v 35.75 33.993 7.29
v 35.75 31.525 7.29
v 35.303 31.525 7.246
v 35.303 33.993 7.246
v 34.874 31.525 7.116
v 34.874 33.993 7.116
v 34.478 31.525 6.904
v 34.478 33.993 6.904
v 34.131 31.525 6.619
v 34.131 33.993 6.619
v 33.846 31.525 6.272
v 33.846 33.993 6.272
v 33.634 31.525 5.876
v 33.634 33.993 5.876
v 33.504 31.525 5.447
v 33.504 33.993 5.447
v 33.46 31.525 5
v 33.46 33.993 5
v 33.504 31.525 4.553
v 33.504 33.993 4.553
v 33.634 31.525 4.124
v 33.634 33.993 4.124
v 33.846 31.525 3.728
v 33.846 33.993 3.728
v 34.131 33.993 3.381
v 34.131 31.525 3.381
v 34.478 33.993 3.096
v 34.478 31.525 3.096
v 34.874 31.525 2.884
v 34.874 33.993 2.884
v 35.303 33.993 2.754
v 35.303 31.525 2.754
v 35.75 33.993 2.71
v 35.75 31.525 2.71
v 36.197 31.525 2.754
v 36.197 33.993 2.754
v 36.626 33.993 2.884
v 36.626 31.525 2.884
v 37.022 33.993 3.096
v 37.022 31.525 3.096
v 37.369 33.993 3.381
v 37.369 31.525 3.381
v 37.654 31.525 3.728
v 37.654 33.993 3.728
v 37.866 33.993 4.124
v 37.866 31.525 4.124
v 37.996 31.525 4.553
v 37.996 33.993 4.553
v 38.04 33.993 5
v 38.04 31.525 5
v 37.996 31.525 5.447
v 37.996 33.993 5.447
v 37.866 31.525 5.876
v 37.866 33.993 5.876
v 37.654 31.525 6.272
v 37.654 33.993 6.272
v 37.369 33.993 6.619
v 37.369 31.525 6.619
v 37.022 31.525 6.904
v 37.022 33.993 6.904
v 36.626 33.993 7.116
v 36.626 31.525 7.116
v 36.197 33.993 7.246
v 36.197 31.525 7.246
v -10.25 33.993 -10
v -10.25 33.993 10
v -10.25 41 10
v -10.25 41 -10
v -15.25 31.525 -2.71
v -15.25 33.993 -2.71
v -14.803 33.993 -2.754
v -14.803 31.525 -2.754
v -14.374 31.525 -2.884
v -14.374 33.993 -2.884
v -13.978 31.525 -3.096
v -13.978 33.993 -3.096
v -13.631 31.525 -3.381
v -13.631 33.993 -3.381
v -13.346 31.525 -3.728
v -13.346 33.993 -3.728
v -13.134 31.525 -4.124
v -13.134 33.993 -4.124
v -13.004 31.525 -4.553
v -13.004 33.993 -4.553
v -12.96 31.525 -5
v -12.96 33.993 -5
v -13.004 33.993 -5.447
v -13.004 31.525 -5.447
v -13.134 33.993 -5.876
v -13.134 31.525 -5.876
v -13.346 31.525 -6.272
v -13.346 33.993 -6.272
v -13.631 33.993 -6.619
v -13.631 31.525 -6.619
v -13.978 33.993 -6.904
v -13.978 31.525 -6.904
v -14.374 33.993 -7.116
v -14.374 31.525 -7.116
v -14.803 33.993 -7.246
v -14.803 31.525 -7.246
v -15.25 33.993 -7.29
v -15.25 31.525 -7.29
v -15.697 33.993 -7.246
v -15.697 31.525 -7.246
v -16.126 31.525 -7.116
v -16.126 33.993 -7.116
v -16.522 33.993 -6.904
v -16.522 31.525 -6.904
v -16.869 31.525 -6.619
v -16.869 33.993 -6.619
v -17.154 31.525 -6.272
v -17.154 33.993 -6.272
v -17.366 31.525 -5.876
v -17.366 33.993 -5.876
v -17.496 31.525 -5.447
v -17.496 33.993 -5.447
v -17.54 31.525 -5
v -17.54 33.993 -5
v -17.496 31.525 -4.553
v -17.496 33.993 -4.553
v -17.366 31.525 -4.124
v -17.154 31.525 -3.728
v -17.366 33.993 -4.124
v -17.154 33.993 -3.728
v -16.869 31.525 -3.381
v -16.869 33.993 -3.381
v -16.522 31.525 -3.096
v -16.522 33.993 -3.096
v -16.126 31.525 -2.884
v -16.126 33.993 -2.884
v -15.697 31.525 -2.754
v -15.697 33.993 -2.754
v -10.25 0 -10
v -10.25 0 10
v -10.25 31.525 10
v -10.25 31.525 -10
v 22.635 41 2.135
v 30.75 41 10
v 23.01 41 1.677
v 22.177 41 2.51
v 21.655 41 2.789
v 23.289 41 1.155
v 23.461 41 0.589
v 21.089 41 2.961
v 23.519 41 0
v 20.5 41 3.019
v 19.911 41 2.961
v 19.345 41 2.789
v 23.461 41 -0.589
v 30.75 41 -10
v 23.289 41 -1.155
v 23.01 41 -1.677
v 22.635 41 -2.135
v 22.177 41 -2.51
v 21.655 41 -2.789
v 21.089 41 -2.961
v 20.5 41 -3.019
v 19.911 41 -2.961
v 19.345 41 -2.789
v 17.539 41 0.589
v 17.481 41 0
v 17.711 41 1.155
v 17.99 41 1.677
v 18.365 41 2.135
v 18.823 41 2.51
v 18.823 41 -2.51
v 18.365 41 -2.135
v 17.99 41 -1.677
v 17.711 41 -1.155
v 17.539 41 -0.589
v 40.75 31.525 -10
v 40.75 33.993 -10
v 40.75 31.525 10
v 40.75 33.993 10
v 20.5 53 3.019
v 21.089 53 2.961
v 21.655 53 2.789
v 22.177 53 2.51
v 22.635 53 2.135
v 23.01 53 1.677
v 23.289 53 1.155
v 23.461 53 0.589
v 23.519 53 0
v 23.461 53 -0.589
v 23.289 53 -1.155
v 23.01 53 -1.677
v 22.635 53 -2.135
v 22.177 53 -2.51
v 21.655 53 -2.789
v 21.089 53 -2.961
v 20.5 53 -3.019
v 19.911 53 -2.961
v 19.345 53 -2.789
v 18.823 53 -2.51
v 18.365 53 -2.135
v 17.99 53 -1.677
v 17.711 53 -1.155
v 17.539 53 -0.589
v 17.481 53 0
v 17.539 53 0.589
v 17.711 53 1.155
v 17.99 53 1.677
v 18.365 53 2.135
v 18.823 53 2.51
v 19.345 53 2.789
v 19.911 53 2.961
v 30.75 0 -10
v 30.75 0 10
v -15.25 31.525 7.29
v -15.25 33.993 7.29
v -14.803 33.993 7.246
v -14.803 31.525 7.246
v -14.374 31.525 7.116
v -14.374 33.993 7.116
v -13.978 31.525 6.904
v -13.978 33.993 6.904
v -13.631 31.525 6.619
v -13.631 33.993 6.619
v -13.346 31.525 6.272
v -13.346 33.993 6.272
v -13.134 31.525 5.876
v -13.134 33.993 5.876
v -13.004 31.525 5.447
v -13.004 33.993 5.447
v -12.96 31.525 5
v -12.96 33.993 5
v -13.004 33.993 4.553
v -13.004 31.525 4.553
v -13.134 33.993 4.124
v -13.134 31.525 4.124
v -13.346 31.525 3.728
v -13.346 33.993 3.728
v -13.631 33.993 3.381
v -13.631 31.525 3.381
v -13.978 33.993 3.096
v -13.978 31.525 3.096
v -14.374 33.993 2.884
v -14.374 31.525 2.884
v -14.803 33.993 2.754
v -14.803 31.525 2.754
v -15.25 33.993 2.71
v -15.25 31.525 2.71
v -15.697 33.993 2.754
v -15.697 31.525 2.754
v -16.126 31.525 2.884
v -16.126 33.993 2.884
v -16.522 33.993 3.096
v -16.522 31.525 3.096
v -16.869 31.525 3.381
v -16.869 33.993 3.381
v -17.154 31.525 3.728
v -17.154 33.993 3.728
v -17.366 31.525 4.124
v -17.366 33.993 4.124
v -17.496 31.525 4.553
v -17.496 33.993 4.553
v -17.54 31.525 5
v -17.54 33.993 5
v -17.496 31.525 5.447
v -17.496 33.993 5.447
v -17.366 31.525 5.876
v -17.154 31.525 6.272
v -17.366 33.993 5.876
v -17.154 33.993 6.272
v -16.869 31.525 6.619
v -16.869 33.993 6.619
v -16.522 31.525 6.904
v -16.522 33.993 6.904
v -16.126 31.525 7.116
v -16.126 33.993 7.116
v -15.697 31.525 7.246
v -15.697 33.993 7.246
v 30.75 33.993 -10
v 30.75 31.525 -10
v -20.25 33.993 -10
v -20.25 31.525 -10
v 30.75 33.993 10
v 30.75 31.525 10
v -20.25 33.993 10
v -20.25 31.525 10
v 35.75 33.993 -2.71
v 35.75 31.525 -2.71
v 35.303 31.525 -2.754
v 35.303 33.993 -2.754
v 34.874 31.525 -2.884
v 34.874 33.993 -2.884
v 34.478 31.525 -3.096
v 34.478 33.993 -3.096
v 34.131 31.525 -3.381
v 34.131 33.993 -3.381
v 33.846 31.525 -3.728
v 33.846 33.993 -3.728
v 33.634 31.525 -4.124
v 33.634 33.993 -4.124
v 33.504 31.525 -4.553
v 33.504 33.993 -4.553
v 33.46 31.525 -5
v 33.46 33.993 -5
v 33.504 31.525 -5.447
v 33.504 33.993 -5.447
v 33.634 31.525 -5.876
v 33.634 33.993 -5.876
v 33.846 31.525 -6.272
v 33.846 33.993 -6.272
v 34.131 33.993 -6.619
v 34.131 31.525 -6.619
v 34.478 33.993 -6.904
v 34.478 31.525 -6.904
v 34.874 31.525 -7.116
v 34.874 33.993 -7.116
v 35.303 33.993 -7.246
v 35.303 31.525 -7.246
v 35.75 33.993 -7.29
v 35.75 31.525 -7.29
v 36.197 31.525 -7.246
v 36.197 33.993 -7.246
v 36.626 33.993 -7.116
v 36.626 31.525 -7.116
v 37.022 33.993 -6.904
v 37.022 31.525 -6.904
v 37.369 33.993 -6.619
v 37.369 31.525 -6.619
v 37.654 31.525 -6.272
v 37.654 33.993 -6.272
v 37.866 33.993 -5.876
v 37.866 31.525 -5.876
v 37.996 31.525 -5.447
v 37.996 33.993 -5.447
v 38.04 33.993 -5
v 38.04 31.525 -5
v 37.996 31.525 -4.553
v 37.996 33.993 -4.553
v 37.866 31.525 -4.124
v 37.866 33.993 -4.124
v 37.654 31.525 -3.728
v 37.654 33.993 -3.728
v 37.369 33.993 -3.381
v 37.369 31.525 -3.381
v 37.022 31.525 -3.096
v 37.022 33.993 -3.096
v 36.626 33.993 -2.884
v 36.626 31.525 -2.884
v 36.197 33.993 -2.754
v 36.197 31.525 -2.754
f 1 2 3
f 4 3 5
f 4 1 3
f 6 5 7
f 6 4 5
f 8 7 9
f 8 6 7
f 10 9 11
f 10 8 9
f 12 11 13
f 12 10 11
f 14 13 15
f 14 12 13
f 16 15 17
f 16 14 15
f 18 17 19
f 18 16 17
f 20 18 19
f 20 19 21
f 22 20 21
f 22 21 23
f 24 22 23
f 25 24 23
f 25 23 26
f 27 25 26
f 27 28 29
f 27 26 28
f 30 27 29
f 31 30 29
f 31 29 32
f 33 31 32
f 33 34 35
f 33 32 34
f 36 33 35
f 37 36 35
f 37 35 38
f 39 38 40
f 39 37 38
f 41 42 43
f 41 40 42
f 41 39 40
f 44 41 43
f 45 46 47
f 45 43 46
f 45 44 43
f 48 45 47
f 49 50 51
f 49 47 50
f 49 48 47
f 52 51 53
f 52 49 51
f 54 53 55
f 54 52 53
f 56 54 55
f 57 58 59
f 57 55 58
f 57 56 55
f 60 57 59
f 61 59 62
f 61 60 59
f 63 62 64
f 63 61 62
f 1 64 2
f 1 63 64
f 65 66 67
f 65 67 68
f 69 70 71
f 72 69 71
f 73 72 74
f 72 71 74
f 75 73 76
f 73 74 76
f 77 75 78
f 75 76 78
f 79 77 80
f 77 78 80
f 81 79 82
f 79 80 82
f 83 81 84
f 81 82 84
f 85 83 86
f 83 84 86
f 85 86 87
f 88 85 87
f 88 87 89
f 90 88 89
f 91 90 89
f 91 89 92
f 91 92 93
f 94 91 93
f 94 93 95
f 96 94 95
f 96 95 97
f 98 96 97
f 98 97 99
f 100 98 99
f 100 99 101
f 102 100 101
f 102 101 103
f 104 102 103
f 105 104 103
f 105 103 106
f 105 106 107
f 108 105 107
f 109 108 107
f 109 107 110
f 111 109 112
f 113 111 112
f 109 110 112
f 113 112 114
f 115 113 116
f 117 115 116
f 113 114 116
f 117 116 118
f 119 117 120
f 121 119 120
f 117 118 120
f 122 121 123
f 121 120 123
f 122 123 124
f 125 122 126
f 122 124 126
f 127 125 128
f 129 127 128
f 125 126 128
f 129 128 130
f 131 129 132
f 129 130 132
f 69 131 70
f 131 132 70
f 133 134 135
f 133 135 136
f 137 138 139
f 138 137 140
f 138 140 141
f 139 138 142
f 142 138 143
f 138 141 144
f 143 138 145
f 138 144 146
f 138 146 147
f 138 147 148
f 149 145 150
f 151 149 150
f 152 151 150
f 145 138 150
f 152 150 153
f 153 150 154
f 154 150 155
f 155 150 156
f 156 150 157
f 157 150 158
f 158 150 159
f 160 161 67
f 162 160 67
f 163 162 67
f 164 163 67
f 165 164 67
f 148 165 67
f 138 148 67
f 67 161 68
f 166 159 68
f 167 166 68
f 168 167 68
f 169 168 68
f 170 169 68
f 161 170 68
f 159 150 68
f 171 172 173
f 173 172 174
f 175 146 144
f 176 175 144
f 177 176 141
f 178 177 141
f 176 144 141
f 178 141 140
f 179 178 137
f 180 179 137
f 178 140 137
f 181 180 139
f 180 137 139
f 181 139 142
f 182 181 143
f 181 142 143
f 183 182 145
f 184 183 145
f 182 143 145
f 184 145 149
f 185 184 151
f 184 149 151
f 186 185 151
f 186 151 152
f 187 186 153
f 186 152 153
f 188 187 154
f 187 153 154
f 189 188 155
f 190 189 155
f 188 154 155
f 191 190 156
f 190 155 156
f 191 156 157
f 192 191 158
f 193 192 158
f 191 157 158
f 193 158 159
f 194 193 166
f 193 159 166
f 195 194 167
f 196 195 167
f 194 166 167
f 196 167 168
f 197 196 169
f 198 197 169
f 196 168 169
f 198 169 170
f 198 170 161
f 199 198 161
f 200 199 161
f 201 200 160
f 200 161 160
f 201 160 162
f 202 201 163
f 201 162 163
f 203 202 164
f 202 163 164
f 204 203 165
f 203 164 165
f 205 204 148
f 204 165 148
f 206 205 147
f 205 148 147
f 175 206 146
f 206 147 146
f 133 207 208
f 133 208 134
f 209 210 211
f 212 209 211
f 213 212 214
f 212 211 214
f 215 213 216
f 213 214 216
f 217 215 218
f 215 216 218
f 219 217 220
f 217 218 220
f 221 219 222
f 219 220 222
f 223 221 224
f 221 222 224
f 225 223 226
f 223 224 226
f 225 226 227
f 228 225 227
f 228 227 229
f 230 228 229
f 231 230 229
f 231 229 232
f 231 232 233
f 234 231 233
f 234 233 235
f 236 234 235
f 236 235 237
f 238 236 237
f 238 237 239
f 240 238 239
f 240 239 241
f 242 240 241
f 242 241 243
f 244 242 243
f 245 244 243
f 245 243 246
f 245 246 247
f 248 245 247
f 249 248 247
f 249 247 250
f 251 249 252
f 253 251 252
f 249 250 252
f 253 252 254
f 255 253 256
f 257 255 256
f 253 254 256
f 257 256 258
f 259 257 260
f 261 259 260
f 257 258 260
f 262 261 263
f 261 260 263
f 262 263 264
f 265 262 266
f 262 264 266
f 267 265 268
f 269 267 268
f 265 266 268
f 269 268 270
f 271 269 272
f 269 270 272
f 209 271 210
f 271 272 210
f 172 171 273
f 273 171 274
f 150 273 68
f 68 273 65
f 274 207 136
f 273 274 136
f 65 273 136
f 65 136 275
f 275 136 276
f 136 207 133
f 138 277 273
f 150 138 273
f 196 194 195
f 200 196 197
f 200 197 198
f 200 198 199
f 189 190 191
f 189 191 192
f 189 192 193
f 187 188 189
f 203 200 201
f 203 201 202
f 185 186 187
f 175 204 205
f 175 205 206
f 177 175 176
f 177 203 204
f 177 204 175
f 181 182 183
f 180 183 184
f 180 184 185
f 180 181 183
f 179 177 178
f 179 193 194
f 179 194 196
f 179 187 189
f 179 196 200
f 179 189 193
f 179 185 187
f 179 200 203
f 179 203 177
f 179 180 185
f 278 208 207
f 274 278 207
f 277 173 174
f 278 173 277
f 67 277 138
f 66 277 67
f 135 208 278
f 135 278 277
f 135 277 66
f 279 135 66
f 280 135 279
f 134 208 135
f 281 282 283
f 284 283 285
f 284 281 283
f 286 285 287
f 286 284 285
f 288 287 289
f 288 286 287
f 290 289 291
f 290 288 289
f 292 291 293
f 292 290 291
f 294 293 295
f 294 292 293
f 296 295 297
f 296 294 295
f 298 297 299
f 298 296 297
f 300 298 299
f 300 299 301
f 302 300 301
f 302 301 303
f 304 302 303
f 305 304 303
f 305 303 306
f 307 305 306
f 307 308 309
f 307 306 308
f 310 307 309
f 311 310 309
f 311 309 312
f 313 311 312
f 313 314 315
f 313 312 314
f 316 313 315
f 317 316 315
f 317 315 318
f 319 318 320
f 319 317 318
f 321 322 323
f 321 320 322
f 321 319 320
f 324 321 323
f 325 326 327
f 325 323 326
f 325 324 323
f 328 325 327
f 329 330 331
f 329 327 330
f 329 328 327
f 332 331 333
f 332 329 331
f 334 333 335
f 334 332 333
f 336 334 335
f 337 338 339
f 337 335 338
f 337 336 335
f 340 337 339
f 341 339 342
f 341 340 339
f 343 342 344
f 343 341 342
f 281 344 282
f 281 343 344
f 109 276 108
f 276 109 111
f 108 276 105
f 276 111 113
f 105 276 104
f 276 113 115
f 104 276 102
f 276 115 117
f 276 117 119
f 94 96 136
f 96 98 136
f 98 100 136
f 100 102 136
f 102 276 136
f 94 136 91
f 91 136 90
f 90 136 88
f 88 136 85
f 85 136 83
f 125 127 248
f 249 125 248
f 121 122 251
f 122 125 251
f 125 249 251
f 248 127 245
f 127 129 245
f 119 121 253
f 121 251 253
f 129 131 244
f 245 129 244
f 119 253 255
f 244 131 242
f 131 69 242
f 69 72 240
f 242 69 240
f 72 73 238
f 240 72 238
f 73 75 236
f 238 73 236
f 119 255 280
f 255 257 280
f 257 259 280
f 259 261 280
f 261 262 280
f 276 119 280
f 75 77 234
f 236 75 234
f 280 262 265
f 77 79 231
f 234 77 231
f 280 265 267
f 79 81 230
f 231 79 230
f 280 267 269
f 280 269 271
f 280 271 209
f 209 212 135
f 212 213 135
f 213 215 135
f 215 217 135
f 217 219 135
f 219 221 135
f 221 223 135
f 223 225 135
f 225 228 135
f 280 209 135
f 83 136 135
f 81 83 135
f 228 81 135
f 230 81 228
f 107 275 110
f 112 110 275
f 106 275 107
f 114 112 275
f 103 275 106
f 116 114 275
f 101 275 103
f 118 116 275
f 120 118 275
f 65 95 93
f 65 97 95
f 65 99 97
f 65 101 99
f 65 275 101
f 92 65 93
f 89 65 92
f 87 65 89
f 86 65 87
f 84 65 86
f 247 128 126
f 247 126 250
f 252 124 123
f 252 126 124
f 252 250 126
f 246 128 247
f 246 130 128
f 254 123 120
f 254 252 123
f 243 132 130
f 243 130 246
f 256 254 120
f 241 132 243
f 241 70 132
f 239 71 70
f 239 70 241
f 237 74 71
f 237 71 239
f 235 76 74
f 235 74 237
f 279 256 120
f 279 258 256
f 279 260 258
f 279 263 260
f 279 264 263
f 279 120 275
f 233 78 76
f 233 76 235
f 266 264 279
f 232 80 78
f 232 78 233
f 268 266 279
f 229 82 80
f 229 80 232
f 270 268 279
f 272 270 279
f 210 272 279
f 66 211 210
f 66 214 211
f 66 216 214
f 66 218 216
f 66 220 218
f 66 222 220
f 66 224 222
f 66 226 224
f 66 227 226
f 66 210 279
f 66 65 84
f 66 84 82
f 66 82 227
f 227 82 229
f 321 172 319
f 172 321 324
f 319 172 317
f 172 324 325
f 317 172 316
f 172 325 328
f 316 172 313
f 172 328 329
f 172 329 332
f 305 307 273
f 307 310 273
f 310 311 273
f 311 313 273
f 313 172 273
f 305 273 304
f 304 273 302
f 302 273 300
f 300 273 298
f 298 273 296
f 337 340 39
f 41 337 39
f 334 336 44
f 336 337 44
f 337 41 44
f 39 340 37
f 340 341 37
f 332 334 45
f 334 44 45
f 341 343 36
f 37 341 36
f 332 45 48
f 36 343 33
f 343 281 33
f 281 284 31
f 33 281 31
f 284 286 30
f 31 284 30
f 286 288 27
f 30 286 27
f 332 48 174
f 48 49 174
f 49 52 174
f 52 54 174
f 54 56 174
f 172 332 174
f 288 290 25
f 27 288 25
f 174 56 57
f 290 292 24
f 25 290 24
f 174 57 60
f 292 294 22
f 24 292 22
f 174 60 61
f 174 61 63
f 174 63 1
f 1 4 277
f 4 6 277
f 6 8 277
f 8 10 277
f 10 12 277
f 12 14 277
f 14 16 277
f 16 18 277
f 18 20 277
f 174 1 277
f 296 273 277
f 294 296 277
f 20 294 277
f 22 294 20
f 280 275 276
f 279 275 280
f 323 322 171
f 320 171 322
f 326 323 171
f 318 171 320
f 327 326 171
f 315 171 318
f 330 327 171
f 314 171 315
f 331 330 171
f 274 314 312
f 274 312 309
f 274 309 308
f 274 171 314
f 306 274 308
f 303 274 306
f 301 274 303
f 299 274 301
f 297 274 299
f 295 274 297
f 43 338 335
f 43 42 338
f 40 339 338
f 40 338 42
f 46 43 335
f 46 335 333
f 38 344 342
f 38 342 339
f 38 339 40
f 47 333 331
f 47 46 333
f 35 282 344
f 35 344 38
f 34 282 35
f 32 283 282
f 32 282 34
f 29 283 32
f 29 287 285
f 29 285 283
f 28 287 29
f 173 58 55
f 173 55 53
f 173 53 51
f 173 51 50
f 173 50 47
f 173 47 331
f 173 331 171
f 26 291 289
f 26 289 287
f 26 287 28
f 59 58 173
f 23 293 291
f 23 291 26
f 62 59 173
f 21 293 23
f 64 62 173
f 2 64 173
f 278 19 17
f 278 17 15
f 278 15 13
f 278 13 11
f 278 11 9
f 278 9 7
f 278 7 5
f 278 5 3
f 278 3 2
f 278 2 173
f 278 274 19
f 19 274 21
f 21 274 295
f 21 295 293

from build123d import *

# Parameters (mm, degrees)
SKETCH1_W           = 20.5
SKETCH1_H           = 20
BOSS_EXTRUDE1_DEPTH = 41
SKETCH3_W           = 20
SKETCH3_H           = 2.467931734
BOSS_EXTRUDE2_DEPTH = 10
SKETCH4_R           = 2.290313936
CUT_EXTRUDE9_DEPTH  = 10
SKETCH5_R           = 3.018718549
BOSS_EXTRUDE3_DEPTH = 12


with BuildPart() as part:
    # Sketch1 → Boss-Extrude1 (new body)
    with BuildSketch(Plane(origin=(0, 0, 0), x_dir=(1, 0, 0), z_dir=(0, 1, 0))):
        Rectangle(SKETCH1_W, SKETCH1_H)
    boss_extrude1 = extrude(amount=BOSS_EXTRUDE1_DEPTH)

    # Sketch3 → Boss-Extrude2 (add)
    with BuildSketch(Plane.ZY.offset(10.25)):
        with Locations((0, 32.759182637)):
            Rectangle(SKETCH3_W, SKETCH3_H)
    boss_extrude2 = extrude(amount=BOSS_EXTRUDE2_DEPTH)

    # Sketch4 → Cut-Extrude9 (cut)
    with BuildSketch(Plane(origin=(0, 33.993148504, 0), x_dir=(1, 0, 0), z_dir=(0, 1, 0))):
        with Locations(Location((-15.25, 5, 0), (0, 0, 270))):
            Circle(SKETCH4_R)
        with Locations(Location((-15.25, -5, 0), (0, 0, 270))):
            Circle(SKETCH4_R)
    cut_extrude9 = extrude(amount=-CUT_EXTRUDE9_DEPTH, mode=Mode.SUBTRACT)

    # Mirror1: Boss-Extrude1, Boss-Extrude2, Cut-Extrude9 across plane
    add(boss_extrude1.mirror(Plane(origin=(10.25, 41, -10), x_dir=(0, 0, 1), z_dir=(-1, 0, 0))))
    add(boss_extrude2.mirror(Plane(origin=(10.25, 41, -10), x_dir=(0, 0, 1), z_dir=(-1, 0, 0))))
    add(cut_extrude9.mirror(Plane(origin=(10.25, 41, -10), x_dir=(0, 0, 1), z_dir=(-1, 0, 0))), mode=Mode.SUBTRACT)

    # Sketch5 → Boss-Extrude3 (add)
    with BuildSketch(Plane(origin=(0, 41, 0), x_dir=(1, 0, 0), z_dir=(0, 1, 0))):
        with Locations(Location((20.5, 0, 0), (0, 0, 270))):
            Circle(SKETCH5_R)
    extrude(amount=BOSS_EXTRUDE3_DEPTH)


solid = part.part
